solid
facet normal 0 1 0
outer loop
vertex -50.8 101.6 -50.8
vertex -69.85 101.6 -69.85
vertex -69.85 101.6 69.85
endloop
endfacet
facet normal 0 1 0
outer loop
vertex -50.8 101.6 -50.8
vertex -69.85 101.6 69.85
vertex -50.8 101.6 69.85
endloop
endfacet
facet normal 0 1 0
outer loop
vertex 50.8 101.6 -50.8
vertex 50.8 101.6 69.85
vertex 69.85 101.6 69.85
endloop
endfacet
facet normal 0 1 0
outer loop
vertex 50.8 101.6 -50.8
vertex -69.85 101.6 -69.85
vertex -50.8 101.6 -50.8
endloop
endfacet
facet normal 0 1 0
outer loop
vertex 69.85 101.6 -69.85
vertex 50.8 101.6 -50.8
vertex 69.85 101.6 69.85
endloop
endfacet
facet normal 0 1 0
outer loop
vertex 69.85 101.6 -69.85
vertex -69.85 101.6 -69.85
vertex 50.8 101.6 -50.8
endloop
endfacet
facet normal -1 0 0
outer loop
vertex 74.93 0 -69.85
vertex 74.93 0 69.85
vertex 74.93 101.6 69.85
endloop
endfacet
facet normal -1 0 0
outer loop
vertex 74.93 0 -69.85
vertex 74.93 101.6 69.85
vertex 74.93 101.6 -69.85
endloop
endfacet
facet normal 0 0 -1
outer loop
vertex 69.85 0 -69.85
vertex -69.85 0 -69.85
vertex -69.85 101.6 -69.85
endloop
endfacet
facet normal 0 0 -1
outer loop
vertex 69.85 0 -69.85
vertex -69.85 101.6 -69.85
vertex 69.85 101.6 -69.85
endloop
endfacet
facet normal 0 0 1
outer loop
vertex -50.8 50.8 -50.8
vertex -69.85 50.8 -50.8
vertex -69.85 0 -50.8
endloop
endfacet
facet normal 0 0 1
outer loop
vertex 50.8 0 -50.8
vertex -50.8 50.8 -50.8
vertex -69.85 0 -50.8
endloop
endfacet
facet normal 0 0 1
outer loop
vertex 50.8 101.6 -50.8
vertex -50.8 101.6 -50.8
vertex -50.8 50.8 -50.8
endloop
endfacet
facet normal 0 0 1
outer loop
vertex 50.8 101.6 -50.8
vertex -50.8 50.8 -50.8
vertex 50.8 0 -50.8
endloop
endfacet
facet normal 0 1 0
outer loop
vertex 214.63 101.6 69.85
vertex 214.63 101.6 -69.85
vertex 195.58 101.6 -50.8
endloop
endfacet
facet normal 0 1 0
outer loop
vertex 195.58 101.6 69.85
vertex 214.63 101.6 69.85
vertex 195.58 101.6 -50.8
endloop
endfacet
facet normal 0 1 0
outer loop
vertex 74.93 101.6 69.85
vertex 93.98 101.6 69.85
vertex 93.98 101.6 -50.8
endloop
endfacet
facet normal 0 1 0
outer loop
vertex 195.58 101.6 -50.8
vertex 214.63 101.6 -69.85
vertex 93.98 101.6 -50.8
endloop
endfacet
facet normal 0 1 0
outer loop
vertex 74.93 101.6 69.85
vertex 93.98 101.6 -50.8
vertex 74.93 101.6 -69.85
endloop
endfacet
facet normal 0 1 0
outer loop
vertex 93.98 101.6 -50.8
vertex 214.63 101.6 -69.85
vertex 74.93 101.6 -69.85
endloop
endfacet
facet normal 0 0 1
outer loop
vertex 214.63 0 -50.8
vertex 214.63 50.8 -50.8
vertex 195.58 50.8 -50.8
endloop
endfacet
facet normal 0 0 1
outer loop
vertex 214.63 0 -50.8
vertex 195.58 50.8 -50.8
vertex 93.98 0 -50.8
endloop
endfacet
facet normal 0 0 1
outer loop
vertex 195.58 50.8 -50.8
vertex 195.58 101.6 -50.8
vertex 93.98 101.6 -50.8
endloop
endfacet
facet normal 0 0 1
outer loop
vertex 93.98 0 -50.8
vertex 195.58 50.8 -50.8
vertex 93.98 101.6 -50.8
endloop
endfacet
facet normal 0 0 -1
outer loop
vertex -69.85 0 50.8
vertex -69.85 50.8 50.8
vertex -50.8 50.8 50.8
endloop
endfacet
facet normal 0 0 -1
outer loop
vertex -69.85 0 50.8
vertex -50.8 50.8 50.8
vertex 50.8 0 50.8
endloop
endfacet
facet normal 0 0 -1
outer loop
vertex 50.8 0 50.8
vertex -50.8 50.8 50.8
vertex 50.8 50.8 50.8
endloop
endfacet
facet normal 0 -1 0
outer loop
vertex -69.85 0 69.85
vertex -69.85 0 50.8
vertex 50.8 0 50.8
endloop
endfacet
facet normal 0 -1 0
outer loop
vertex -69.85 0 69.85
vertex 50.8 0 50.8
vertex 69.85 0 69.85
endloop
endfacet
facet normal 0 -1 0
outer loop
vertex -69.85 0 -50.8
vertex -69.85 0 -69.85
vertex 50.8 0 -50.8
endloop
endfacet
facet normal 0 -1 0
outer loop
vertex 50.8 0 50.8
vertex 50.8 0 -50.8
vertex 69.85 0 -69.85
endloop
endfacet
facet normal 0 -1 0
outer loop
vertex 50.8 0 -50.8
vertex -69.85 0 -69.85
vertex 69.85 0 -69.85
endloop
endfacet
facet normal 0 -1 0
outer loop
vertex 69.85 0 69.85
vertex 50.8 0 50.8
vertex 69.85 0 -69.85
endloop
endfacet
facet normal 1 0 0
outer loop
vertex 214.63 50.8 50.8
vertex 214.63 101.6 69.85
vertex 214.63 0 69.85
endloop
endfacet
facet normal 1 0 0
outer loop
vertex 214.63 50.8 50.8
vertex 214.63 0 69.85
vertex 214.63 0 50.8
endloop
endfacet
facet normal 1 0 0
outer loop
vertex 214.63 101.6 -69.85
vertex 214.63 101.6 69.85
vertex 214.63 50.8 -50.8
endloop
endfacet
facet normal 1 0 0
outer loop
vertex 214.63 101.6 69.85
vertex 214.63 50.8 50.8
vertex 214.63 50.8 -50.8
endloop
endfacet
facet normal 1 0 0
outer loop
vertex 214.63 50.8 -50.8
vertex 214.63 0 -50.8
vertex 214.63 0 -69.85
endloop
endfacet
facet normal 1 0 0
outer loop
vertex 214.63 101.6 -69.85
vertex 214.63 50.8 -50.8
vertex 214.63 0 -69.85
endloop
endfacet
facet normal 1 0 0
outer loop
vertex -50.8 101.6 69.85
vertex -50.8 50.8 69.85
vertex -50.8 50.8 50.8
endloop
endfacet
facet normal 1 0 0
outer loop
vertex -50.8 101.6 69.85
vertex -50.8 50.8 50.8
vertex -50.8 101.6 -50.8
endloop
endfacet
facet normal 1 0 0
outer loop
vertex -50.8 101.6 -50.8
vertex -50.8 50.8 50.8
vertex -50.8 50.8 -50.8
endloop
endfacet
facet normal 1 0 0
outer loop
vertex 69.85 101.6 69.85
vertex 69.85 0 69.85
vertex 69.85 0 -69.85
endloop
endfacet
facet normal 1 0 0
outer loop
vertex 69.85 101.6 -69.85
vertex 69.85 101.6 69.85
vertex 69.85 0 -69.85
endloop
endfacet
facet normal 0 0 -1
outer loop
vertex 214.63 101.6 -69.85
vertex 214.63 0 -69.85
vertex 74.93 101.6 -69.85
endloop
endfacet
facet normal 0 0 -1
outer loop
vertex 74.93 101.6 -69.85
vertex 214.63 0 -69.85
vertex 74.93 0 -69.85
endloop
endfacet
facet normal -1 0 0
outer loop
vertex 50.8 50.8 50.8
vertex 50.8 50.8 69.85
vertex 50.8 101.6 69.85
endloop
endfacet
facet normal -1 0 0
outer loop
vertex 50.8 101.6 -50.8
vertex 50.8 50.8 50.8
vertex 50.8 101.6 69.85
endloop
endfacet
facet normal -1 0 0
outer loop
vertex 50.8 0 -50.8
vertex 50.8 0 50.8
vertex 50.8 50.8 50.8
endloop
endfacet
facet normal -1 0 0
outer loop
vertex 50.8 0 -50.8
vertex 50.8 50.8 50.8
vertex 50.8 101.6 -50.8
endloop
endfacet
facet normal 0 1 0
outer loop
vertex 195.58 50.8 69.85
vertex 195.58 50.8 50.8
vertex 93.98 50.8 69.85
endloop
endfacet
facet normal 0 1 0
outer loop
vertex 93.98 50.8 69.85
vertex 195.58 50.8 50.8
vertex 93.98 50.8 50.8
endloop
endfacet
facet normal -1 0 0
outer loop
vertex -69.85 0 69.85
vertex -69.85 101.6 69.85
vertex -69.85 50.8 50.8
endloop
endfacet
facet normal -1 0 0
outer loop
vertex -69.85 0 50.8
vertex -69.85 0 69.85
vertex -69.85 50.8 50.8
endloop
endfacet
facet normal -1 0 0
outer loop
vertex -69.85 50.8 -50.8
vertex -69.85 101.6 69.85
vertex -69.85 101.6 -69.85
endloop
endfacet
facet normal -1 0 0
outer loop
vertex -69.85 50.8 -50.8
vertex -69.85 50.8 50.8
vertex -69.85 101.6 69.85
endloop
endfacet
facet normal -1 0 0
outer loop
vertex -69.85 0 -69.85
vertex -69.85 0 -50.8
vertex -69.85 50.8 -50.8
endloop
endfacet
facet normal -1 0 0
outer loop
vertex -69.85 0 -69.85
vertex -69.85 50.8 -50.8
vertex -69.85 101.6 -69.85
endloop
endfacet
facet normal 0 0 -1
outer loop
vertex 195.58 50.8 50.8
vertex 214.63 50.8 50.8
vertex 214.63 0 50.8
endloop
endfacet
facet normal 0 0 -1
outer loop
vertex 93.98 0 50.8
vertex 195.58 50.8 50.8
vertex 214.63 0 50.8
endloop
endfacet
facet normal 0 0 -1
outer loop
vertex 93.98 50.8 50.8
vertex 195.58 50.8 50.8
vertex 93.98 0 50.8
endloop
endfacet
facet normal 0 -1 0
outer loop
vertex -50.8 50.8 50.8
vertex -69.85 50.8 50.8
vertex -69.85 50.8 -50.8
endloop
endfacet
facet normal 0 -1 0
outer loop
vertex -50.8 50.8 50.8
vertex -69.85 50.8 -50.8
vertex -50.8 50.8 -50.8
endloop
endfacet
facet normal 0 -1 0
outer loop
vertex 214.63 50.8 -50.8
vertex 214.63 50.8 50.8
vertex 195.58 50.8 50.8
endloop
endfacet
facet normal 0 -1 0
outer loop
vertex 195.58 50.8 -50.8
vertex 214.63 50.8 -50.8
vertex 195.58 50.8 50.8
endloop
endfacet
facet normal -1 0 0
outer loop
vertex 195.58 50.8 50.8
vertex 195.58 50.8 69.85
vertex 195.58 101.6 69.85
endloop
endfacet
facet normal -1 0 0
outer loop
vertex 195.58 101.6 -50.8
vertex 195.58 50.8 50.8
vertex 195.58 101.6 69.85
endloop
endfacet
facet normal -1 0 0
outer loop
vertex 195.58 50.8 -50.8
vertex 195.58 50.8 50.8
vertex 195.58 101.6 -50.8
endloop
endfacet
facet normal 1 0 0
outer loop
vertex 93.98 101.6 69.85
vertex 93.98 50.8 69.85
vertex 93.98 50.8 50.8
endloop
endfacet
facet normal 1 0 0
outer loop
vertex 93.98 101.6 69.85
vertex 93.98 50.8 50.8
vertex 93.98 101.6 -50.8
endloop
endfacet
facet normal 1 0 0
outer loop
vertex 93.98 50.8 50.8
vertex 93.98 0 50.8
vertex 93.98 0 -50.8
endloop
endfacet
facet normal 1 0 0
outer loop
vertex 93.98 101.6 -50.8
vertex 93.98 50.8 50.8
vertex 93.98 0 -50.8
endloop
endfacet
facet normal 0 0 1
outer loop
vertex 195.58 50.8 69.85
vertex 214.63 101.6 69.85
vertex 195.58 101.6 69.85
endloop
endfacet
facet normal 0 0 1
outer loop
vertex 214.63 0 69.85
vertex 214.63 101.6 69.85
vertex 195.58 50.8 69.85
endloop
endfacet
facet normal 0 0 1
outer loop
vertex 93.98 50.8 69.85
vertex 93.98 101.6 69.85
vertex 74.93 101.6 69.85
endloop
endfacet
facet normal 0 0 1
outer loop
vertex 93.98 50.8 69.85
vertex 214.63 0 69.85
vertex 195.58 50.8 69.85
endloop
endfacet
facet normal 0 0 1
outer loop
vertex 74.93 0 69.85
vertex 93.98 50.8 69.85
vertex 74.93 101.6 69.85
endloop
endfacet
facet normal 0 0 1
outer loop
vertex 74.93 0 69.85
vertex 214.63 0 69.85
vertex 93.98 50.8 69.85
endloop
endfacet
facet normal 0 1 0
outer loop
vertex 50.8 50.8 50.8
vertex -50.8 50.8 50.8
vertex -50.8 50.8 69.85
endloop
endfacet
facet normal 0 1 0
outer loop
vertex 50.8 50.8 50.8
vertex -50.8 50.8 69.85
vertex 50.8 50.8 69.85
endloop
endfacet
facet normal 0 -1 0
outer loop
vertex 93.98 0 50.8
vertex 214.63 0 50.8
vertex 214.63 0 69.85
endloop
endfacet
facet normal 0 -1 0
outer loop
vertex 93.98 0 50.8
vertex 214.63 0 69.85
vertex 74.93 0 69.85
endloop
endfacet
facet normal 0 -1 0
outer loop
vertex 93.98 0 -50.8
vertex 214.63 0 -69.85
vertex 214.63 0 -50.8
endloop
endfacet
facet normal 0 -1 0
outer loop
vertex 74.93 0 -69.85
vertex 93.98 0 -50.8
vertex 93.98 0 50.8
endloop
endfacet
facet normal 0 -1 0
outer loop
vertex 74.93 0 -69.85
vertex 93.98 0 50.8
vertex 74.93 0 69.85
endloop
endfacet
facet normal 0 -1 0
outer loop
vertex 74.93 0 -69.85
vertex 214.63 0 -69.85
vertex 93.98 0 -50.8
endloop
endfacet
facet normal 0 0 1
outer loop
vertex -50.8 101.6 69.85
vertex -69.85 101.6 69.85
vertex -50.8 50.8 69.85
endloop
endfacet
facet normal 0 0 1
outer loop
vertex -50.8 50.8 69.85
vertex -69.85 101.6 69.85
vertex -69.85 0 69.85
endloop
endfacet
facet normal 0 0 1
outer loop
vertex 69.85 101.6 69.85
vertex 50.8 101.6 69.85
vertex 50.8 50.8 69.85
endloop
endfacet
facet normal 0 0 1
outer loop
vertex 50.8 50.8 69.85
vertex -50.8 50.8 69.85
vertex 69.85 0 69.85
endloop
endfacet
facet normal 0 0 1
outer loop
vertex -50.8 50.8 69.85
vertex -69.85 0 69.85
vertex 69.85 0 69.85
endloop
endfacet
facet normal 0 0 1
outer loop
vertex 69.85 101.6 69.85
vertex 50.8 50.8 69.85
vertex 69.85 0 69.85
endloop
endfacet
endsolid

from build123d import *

# Parameters (mm, degrees)
SKETCH1_W           = 139.7
SKETCH1_H           = 139.7
SKETCH1_W_2         = 101.6
SKETCH1_H_2         = 101.6
EXTRUDE_THIN1_DEPTH = 101.6
CUT_EXTRUDE1_START  = -50.8
SKETCH2_W           = 101.6
SKETCH2_H           = 19.05
CUT_EXTRUDE1_DEPTH  = 50.8
CUT_EXTRUDE2_START  = -50.8
SKETCH3_W           = 19.05
SKETCH3_H           = 101.6
CUT_EXTRUDE2_DEPTH  = 50.8


with BuildPart() as part:
    # Sketch1 → Extrude-Thin1 (new body)
    with BuildSketch(Plane(origin=(0, 0, 0), x_dir=(1, 0, 0), z_dir=(0, 1, 0))):
        Rectangle(SKETCH1_W, SKETCH1_H)
        Rectangle(SKETCH1_W_2, SKETCH1_H_2, mode=Mode.SUBTRACT)
    extrude(amount=EXTRUDE_THIN1_DEPTH)

    # Sketch2 → Cut-Extrude1 (cut)
    with BuildSketch(Plane(origin=(0, 101.6, 0), x_dir=(1, 0, 0), z_dir=(0, 1, 0)).offset(CUT_EXTRUDE1_START)):
        with Locations((0, -60.325)):
            Rectangle(SKETCH2_W, SKETCH2_H)
    extrude(amount=CUT_EXTRUDE1_DEPTH, mode=Mode.SUBTRACT)

    # Sketch3 → Cut-Extrude2 (cut)
    with BuildSketch(Plane.XZ.offset(CUT_EXTRUDE2_START)):
        with Locations((-60.325, 0)):
            Rectangle(SKETCH3_W, SKETCH3_H)
    extrude(amount=CUT_EXTRUDE2_DEPTH, mode=Mode.SUBTRACT)


with BuildPart() as body_2:
    # Mirror2: mirrored copy
    add(part.part.mirror(Plane(origin=(72.39, 0, 0), x_dir=(0, 0, 1), z_dir=(1, 0, 0))))


solid = Compound([part.part, body_2.part])
